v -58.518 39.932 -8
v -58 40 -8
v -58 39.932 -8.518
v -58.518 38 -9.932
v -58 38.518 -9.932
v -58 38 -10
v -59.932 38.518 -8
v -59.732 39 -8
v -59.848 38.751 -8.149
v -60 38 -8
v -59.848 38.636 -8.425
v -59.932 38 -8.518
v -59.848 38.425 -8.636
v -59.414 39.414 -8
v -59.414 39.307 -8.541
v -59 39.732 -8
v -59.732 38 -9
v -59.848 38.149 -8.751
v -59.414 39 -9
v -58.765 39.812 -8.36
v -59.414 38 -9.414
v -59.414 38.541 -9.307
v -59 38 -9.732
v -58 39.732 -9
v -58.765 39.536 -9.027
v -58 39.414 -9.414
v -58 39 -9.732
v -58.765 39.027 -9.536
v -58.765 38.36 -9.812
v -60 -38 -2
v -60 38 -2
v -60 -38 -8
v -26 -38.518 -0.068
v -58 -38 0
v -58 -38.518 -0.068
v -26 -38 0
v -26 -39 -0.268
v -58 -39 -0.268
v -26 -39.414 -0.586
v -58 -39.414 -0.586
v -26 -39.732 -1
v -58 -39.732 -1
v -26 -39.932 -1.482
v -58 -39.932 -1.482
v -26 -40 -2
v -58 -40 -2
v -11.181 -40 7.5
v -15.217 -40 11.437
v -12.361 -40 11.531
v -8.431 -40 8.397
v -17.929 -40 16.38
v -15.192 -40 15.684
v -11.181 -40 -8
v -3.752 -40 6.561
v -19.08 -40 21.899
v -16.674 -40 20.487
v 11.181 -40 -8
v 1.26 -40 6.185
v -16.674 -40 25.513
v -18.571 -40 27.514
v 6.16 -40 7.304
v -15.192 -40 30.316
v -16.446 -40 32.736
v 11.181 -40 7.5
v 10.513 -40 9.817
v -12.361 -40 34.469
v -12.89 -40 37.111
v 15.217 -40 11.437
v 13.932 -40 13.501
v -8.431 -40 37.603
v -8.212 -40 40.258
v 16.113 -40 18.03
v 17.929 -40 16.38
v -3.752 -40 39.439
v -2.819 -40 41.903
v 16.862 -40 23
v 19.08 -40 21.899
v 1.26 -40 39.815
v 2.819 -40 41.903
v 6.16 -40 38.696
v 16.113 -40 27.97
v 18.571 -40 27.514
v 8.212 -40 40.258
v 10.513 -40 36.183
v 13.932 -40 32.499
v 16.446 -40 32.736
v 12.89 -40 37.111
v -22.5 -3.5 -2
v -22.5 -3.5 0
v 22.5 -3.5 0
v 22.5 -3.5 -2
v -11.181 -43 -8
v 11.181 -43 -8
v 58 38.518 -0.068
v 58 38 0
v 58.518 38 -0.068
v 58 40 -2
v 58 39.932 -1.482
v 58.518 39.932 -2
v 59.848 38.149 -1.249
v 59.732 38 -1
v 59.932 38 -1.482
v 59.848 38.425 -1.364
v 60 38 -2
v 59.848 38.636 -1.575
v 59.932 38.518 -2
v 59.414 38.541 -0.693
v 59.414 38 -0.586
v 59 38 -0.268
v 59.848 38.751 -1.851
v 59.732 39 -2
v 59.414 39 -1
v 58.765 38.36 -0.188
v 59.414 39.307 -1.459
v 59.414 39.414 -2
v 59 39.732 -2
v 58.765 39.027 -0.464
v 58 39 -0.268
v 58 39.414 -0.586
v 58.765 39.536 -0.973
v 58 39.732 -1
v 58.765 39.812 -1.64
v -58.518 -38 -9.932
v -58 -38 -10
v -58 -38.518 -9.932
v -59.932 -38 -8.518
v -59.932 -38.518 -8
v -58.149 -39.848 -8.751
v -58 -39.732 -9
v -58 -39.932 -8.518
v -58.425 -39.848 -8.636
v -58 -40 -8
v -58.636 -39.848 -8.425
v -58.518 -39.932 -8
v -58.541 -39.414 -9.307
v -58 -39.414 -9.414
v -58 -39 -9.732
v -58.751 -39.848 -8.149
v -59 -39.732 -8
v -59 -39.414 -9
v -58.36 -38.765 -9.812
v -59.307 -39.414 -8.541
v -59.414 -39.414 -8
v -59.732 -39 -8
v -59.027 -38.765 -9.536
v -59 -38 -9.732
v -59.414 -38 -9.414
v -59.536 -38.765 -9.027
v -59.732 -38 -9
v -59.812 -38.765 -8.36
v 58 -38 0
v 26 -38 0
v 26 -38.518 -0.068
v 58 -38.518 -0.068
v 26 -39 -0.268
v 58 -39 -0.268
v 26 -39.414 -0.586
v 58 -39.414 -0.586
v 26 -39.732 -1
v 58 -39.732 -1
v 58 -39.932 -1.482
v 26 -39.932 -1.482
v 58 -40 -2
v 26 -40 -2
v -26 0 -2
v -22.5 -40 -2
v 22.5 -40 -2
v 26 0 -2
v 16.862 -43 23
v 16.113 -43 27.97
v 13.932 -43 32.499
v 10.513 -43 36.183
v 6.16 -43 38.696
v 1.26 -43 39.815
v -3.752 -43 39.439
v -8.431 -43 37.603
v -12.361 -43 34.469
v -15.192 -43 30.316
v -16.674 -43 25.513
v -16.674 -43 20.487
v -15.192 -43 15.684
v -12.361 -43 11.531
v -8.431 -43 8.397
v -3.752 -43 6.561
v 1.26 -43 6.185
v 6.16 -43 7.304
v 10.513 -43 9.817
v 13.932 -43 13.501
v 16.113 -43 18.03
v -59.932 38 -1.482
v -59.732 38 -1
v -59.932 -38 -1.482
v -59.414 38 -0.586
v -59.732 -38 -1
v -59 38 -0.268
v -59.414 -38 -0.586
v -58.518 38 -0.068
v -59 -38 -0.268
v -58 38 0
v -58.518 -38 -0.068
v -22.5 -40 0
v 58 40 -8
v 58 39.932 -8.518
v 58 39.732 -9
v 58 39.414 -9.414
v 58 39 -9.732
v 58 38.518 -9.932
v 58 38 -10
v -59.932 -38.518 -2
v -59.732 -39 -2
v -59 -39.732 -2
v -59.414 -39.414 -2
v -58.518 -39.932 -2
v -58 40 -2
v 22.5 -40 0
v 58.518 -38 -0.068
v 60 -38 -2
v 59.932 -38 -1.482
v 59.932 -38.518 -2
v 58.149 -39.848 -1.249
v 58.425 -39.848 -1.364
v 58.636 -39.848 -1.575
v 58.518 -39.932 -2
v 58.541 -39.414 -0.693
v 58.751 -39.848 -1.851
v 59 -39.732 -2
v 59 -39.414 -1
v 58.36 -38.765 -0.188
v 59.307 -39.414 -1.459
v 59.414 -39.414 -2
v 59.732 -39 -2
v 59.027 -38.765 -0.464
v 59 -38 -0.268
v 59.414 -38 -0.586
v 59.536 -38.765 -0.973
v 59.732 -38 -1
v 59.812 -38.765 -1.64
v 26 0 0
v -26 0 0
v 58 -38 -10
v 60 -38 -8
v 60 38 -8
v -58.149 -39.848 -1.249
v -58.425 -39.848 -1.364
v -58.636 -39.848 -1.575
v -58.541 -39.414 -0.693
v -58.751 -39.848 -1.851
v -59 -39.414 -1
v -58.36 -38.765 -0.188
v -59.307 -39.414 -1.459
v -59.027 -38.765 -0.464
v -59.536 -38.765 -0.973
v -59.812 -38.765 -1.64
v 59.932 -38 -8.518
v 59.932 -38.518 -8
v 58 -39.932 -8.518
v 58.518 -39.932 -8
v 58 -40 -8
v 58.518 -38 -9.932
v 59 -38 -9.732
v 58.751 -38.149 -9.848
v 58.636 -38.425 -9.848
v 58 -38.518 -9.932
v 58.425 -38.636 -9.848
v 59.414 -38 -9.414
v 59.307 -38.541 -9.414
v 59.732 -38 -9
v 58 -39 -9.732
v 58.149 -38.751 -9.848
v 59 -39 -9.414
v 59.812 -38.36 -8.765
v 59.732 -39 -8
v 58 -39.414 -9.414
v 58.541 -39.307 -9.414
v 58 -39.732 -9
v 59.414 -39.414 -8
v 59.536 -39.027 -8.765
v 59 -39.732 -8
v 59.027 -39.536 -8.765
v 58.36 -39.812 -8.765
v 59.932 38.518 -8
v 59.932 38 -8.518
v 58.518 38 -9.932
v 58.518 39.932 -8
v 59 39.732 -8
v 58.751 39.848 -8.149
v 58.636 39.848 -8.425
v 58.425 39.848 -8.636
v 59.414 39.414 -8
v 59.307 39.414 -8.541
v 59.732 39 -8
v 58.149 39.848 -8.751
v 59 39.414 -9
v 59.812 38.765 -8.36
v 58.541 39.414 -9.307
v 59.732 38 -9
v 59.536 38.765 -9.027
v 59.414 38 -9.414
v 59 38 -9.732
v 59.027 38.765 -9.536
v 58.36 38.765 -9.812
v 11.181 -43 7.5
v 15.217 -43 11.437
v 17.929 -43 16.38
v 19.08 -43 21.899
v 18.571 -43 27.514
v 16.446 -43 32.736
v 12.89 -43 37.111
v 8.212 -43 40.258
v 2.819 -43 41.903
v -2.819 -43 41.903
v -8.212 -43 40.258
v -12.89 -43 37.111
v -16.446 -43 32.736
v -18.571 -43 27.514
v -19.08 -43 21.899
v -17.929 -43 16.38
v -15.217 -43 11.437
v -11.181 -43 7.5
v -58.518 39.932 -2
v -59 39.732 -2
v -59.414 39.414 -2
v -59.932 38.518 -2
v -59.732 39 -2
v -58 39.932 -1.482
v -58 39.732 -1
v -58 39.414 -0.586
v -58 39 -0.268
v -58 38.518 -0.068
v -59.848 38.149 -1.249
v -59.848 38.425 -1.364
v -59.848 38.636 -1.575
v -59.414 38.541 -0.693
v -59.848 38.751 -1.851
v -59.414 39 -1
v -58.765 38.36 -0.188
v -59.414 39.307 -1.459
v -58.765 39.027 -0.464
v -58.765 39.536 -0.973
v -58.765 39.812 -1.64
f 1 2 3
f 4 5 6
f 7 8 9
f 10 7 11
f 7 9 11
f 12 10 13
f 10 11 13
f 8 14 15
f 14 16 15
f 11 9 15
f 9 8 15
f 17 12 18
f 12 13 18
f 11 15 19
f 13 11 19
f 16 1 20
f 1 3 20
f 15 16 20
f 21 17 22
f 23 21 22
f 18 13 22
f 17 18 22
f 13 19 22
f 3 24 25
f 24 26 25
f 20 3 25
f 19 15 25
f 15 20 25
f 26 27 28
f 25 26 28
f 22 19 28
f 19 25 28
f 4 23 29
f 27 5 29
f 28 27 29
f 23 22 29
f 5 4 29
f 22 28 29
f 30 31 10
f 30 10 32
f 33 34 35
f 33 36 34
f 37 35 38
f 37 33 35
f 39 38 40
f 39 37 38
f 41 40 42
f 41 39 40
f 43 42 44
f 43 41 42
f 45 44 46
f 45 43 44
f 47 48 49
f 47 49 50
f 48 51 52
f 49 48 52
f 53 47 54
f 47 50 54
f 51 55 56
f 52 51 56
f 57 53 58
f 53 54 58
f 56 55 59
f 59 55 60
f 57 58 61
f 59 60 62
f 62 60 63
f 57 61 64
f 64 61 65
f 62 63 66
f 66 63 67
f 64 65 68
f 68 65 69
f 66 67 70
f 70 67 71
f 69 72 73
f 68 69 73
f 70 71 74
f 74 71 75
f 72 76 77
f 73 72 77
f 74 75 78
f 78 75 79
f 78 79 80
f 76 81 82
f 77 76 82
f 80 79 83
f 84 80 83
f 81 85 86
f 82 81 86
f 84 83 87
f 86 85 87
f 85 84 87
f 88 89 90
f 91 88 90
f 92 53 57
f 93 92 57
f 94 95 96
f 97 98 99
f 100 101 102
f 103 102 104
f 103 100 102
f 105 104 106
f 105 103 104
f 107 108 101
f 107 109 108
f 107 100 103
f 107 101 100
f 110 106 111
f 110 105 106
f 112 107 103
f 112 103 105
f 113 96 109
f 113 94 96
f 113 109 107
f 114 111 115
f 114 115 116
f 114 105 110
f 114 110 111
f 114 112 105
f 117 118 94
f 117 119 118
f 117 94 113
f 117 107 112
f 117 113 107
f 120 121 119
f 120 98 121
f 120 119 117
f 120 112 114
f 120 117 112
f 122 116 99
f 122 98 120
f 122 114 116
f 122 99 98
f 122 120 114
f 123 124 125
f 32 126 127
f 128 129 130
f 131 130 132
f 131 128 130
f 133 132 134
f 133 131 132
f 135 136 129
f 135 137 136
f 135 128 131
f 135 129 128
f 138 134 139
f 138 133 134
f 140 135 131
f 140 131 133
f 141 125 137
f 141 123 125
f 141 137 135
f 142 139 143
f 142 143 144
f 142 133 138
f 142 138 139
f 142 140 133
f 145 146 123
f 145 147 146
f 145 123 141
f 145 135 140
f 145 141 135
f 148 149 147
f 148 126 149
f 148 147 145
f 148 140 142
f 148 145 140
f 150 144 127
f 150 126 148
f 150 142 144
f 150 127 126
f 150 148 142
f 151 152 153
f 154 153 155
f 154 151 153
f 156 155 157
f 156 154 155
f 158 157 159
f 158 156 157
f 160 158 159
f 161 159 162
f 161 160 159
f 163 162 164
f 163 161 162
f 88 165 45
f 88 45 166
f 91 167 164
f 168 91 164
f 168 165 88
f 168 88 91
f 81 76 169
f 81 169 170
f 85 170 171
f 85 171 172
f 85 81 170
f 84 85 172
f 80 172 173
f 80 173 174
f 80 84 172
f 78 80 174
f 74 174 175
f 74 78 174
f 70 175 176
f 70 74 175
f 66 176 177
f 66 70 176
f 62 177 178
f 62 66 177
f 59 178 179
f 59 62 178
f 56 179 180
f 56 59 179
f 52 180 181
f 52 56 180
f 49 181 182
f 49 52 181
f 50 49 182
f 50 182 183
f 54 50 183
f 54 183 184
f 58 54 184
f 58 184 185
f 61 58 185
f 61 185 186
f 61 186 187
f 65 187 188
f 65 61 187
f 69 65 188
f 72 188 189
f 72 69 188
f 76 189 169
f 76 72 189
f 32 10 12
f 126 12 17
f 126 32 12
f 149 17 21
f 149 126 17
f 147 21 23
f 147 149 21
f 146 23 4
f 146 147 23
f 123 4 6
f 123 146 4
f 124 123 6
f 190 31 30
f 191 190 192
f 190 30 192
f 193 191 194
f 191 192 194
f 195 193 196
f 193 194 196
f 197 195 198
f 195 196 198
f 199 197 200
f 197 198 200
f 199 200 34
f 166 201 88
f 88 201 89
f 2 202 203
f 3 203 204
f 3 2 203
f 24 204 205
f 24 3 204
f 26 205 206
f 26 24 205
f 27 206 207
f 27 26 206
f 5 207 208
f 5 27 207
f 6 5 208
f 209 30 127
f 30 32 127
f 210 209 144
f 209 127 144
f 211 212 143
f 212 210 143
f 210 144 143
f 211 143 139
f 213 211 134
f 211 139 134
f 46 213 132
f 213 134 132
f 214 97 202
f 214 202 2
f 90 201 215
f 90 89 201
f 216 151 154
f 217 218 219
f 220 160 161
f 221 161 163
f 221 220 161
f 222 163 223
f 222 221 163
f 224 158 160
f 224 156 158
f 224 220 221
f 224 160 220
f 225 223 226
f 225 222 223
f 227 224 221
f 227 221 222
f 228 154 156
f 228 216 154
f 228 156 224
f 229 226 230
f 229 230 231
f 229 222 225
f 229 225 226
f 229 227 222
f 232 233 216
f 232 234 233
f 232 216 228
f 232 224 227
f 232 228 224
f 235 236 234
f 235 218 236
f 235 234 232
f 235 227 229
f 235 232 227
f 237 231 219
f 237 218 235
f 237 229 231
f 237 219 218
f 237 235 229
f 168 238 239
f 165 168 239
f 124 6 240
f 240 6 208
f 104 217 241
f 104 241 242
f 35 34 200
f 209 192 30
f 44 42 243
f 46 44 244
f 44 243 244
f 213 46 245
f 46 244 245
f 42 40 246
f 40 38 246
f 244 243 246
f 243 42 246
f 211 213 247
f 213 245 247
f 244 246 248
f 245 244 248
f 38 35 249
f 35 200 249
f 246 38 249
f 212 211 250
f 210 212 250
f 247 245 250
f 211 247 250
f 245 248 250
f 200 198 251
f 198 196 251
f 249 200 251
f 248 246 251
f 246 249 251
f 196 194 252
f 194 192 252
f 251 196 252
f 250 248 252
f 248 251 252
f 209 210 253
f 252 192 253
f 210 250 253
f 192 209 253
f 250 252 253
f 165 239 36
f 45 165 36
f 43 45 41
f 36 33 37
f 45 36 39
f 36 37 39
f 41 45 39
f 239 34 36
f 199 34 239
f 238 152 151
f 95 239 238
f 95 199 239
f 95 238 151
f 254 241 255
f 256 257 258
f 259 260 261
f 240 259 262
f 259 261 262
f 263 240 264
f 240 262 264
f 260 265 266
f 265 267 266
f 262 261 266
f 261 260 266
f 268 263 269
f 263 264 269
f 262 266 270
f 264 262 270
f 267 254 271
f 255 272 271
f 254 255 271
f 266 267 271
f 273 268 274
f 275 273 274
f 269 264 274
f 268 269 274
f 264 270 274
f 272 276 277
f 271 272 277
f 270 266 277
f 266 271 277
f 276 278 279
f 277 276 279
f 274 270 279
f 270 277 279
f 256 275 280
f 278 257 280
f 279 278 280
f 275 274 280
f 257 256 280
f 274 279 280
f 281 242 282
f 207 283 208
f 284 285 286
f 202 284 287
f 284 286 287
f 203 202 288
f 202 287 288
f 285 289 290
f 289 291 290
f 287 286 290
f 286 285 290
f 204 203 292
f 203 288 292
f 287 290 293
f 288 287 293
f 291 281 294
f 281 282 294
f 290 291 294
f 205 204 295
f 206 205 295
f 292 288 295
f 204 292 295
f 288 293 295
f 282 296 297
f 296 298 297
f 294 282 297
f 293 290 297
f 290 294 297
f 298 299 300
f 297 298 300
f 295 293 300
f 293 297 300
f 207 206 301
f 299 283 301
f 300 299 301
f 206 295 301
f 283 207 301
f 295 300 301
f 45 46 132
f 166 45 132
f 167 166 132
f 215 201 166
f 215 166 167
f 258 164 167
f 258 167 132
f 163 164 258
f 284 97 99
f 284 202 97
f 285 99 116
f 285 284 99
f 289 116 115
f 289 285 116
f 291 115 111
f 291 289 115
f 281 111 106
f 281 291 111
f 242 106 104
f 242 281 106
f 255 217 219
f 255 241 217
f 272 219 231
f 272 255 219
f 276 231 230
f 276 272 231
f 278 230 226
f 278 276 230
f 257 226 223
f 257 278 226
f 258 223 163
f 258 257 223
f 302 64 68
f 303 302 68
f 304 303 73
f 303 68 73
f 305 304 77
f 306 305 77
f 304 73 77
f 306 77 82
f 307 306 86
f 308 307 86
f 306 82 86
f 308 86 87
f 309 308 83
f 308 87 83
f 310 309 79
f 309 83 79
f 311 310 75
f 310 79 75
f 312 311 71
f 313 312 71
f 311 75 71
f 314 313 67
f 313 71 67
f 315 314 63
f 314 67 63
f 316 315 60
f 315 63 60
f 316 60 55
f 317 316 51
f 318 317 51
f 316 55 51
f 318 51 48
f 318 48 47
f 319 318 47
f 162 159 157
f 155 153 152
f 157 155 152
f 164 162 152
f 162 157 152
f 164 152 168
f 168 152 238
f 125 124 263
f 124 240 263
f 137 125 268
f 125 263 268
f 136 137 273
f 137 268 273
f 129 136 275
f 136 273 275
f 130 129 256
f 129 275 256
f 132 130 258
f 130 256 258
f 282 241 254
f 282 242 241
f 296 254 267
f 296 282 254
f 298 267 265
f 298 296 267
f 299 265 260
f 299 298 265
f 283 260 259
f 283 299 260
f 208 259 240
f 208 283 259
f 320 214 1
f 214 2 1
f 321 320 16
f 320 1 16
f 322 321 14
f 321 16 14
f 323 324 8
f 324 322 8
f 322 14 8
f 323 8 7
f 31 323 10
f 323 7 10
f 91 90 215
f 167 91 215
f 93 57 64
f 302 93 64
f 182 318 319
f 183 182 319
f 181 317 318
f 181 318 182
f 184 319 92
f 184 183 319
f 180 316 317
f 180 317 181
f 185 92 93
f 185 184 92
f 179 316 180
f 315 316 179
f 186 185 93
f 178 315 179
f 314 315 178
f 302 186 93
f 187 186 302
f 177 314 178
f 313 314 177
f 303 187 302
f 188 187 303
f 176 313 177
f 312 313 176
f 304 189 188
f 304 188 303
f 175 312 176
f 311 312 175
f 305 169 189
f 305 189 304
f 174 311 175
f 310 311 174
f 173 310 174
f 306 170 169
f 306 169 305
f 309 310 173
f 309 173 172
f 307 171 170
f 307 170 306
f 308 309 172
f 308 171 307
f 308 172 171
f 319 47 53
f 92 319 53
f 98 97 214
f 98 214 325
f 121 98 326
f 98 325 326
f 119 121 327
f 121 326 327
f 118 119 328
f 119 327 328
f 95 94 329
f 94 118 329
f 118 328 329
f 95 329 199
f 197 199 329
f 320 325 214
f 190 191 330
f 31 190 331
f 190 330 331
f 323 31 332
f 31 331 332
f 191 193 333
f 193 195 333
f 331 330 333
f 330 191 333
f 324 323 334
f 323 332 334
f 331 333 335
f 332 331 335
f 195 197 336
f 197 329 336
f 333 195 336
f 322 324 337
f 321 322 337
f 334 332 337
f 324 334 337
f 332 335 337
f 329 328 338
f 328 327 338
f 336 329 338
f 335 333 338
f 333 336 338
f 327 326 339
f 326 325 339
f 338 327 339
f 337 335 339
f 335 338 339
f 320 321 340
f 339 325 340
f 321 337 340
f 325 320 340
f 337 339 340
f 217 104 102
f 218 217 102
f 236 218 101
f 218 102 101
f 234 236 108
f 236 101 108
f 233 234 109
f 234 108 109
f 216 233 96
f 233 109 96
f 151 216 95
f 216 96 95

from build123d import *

# Parameters (mm, degrees)
F1_DEPTH = 10
F3_DEPTH = 2
F4_R     = 2
F5_R     = 16.8618746788
F6_DEPTH = 3


with BuildPart() as f1:
    # F0 (on Top) → F1 (new body)
    with BuildSketch(Plane.XY):
        Polygon((60, 40), (-60, 40), (-60, -40), (-25.860209018, -40), (-25.860209018, 0), (-25.860209018, 3.5), (26, 3.5), (26, 0), (26, -40), (60, -40), align=None)
        Polygon((-25.860209018, 0), (-25.860209018, -40), (-22.360209018, -40), (-22.360209018, 0), (0, 0), (22.5, 0), (22.5, -40), (26, -40), (26, 0), (26, 3.5), (-25.860209018, 3.5), align=None)
        Polygon((-22.360209018, 0), (-22.360209018, -40), (22.5, -40), (22.5, 0), (0, 0), align=None)
    extrude(amount=-F1_DEPTH)

    # F2 (on face) → F3 (cut)
    with BuildSketch(Plane.XY):
        Polygon((0, -3.5), (0, 0), (-26, 0), (-26, -40), (-22.5, -40), (-22.5, -3.5), align=None)
        Polygon((26, 0), (0, 0), (0, -3.5), (22.5, -3.5), (22.5, -40), (26, -40), align=None)
    extrude(amount=-F3_DEPTH, mode=Mode.SUBTRACT)

    # F4
    f4_edges = [f1.edges().sort_by_distance(p)[0] for p in [
        (0, 40, 0),
        (-60, 0, 0),
        (60, 0, 0),
        (43, -40, 0),
        (-43, -40, 0),
        (60, -40, -5),
        (60, 0, -10),
        (60, 40, -5),
        (0, 40, -10),
        (-60, 40, -5),
        (-60, 0, -10),
        (0, -40, -10),
        (-60, -40, -5),
    ]]
    fillet(f4_edges, radius=F4_R)


with BuildPart() as f6:
    # F5 (on face) → F6 (new body)
    with BuildSketch(Plane.XZ.offset(40)):
        with BuildLine():
            ThreePointArc((11.1809549564, 7.5), (0, 3.8881253212), (-11.1809549564, 7.5))
            Line((-11.1809549564, 7.5), (-11.1809549564, 0))
            Line((-11.1809549564, 0), (0, 0))
            Line((0, 0), (11.1809549564, 0))
            Line((11.1809549564, 0), (11.1809549564, 7.5))
        make_face()
        with BuildLine():
            ThreePointArc((11.1809549564, 7.5), (17.014005461, 14.2944057118), (19.1118746788, 23))
            ThreePointArc((19.1118746788, 23), (-8.7055942882, 40.014005461), (-11.1809549564, 7.5))
            ThreePointArc((-11.1809549564, 7.5), (0, 3.8881253212), (11.1809549564, 7.5))
        make_face()
        with Locations((0, 23)):
            Circle(F5_R, mode=Mode.SUBTRACT)
        Polygon((0, 0), (-11.1809549564, 0), (-11.1809549564, -8), (11.1809549564, -8), (11.1809549564, 0), align=None)
    extrude(amount=F6_DEPTH)


solid = Compound([f1.part, f6.part])
